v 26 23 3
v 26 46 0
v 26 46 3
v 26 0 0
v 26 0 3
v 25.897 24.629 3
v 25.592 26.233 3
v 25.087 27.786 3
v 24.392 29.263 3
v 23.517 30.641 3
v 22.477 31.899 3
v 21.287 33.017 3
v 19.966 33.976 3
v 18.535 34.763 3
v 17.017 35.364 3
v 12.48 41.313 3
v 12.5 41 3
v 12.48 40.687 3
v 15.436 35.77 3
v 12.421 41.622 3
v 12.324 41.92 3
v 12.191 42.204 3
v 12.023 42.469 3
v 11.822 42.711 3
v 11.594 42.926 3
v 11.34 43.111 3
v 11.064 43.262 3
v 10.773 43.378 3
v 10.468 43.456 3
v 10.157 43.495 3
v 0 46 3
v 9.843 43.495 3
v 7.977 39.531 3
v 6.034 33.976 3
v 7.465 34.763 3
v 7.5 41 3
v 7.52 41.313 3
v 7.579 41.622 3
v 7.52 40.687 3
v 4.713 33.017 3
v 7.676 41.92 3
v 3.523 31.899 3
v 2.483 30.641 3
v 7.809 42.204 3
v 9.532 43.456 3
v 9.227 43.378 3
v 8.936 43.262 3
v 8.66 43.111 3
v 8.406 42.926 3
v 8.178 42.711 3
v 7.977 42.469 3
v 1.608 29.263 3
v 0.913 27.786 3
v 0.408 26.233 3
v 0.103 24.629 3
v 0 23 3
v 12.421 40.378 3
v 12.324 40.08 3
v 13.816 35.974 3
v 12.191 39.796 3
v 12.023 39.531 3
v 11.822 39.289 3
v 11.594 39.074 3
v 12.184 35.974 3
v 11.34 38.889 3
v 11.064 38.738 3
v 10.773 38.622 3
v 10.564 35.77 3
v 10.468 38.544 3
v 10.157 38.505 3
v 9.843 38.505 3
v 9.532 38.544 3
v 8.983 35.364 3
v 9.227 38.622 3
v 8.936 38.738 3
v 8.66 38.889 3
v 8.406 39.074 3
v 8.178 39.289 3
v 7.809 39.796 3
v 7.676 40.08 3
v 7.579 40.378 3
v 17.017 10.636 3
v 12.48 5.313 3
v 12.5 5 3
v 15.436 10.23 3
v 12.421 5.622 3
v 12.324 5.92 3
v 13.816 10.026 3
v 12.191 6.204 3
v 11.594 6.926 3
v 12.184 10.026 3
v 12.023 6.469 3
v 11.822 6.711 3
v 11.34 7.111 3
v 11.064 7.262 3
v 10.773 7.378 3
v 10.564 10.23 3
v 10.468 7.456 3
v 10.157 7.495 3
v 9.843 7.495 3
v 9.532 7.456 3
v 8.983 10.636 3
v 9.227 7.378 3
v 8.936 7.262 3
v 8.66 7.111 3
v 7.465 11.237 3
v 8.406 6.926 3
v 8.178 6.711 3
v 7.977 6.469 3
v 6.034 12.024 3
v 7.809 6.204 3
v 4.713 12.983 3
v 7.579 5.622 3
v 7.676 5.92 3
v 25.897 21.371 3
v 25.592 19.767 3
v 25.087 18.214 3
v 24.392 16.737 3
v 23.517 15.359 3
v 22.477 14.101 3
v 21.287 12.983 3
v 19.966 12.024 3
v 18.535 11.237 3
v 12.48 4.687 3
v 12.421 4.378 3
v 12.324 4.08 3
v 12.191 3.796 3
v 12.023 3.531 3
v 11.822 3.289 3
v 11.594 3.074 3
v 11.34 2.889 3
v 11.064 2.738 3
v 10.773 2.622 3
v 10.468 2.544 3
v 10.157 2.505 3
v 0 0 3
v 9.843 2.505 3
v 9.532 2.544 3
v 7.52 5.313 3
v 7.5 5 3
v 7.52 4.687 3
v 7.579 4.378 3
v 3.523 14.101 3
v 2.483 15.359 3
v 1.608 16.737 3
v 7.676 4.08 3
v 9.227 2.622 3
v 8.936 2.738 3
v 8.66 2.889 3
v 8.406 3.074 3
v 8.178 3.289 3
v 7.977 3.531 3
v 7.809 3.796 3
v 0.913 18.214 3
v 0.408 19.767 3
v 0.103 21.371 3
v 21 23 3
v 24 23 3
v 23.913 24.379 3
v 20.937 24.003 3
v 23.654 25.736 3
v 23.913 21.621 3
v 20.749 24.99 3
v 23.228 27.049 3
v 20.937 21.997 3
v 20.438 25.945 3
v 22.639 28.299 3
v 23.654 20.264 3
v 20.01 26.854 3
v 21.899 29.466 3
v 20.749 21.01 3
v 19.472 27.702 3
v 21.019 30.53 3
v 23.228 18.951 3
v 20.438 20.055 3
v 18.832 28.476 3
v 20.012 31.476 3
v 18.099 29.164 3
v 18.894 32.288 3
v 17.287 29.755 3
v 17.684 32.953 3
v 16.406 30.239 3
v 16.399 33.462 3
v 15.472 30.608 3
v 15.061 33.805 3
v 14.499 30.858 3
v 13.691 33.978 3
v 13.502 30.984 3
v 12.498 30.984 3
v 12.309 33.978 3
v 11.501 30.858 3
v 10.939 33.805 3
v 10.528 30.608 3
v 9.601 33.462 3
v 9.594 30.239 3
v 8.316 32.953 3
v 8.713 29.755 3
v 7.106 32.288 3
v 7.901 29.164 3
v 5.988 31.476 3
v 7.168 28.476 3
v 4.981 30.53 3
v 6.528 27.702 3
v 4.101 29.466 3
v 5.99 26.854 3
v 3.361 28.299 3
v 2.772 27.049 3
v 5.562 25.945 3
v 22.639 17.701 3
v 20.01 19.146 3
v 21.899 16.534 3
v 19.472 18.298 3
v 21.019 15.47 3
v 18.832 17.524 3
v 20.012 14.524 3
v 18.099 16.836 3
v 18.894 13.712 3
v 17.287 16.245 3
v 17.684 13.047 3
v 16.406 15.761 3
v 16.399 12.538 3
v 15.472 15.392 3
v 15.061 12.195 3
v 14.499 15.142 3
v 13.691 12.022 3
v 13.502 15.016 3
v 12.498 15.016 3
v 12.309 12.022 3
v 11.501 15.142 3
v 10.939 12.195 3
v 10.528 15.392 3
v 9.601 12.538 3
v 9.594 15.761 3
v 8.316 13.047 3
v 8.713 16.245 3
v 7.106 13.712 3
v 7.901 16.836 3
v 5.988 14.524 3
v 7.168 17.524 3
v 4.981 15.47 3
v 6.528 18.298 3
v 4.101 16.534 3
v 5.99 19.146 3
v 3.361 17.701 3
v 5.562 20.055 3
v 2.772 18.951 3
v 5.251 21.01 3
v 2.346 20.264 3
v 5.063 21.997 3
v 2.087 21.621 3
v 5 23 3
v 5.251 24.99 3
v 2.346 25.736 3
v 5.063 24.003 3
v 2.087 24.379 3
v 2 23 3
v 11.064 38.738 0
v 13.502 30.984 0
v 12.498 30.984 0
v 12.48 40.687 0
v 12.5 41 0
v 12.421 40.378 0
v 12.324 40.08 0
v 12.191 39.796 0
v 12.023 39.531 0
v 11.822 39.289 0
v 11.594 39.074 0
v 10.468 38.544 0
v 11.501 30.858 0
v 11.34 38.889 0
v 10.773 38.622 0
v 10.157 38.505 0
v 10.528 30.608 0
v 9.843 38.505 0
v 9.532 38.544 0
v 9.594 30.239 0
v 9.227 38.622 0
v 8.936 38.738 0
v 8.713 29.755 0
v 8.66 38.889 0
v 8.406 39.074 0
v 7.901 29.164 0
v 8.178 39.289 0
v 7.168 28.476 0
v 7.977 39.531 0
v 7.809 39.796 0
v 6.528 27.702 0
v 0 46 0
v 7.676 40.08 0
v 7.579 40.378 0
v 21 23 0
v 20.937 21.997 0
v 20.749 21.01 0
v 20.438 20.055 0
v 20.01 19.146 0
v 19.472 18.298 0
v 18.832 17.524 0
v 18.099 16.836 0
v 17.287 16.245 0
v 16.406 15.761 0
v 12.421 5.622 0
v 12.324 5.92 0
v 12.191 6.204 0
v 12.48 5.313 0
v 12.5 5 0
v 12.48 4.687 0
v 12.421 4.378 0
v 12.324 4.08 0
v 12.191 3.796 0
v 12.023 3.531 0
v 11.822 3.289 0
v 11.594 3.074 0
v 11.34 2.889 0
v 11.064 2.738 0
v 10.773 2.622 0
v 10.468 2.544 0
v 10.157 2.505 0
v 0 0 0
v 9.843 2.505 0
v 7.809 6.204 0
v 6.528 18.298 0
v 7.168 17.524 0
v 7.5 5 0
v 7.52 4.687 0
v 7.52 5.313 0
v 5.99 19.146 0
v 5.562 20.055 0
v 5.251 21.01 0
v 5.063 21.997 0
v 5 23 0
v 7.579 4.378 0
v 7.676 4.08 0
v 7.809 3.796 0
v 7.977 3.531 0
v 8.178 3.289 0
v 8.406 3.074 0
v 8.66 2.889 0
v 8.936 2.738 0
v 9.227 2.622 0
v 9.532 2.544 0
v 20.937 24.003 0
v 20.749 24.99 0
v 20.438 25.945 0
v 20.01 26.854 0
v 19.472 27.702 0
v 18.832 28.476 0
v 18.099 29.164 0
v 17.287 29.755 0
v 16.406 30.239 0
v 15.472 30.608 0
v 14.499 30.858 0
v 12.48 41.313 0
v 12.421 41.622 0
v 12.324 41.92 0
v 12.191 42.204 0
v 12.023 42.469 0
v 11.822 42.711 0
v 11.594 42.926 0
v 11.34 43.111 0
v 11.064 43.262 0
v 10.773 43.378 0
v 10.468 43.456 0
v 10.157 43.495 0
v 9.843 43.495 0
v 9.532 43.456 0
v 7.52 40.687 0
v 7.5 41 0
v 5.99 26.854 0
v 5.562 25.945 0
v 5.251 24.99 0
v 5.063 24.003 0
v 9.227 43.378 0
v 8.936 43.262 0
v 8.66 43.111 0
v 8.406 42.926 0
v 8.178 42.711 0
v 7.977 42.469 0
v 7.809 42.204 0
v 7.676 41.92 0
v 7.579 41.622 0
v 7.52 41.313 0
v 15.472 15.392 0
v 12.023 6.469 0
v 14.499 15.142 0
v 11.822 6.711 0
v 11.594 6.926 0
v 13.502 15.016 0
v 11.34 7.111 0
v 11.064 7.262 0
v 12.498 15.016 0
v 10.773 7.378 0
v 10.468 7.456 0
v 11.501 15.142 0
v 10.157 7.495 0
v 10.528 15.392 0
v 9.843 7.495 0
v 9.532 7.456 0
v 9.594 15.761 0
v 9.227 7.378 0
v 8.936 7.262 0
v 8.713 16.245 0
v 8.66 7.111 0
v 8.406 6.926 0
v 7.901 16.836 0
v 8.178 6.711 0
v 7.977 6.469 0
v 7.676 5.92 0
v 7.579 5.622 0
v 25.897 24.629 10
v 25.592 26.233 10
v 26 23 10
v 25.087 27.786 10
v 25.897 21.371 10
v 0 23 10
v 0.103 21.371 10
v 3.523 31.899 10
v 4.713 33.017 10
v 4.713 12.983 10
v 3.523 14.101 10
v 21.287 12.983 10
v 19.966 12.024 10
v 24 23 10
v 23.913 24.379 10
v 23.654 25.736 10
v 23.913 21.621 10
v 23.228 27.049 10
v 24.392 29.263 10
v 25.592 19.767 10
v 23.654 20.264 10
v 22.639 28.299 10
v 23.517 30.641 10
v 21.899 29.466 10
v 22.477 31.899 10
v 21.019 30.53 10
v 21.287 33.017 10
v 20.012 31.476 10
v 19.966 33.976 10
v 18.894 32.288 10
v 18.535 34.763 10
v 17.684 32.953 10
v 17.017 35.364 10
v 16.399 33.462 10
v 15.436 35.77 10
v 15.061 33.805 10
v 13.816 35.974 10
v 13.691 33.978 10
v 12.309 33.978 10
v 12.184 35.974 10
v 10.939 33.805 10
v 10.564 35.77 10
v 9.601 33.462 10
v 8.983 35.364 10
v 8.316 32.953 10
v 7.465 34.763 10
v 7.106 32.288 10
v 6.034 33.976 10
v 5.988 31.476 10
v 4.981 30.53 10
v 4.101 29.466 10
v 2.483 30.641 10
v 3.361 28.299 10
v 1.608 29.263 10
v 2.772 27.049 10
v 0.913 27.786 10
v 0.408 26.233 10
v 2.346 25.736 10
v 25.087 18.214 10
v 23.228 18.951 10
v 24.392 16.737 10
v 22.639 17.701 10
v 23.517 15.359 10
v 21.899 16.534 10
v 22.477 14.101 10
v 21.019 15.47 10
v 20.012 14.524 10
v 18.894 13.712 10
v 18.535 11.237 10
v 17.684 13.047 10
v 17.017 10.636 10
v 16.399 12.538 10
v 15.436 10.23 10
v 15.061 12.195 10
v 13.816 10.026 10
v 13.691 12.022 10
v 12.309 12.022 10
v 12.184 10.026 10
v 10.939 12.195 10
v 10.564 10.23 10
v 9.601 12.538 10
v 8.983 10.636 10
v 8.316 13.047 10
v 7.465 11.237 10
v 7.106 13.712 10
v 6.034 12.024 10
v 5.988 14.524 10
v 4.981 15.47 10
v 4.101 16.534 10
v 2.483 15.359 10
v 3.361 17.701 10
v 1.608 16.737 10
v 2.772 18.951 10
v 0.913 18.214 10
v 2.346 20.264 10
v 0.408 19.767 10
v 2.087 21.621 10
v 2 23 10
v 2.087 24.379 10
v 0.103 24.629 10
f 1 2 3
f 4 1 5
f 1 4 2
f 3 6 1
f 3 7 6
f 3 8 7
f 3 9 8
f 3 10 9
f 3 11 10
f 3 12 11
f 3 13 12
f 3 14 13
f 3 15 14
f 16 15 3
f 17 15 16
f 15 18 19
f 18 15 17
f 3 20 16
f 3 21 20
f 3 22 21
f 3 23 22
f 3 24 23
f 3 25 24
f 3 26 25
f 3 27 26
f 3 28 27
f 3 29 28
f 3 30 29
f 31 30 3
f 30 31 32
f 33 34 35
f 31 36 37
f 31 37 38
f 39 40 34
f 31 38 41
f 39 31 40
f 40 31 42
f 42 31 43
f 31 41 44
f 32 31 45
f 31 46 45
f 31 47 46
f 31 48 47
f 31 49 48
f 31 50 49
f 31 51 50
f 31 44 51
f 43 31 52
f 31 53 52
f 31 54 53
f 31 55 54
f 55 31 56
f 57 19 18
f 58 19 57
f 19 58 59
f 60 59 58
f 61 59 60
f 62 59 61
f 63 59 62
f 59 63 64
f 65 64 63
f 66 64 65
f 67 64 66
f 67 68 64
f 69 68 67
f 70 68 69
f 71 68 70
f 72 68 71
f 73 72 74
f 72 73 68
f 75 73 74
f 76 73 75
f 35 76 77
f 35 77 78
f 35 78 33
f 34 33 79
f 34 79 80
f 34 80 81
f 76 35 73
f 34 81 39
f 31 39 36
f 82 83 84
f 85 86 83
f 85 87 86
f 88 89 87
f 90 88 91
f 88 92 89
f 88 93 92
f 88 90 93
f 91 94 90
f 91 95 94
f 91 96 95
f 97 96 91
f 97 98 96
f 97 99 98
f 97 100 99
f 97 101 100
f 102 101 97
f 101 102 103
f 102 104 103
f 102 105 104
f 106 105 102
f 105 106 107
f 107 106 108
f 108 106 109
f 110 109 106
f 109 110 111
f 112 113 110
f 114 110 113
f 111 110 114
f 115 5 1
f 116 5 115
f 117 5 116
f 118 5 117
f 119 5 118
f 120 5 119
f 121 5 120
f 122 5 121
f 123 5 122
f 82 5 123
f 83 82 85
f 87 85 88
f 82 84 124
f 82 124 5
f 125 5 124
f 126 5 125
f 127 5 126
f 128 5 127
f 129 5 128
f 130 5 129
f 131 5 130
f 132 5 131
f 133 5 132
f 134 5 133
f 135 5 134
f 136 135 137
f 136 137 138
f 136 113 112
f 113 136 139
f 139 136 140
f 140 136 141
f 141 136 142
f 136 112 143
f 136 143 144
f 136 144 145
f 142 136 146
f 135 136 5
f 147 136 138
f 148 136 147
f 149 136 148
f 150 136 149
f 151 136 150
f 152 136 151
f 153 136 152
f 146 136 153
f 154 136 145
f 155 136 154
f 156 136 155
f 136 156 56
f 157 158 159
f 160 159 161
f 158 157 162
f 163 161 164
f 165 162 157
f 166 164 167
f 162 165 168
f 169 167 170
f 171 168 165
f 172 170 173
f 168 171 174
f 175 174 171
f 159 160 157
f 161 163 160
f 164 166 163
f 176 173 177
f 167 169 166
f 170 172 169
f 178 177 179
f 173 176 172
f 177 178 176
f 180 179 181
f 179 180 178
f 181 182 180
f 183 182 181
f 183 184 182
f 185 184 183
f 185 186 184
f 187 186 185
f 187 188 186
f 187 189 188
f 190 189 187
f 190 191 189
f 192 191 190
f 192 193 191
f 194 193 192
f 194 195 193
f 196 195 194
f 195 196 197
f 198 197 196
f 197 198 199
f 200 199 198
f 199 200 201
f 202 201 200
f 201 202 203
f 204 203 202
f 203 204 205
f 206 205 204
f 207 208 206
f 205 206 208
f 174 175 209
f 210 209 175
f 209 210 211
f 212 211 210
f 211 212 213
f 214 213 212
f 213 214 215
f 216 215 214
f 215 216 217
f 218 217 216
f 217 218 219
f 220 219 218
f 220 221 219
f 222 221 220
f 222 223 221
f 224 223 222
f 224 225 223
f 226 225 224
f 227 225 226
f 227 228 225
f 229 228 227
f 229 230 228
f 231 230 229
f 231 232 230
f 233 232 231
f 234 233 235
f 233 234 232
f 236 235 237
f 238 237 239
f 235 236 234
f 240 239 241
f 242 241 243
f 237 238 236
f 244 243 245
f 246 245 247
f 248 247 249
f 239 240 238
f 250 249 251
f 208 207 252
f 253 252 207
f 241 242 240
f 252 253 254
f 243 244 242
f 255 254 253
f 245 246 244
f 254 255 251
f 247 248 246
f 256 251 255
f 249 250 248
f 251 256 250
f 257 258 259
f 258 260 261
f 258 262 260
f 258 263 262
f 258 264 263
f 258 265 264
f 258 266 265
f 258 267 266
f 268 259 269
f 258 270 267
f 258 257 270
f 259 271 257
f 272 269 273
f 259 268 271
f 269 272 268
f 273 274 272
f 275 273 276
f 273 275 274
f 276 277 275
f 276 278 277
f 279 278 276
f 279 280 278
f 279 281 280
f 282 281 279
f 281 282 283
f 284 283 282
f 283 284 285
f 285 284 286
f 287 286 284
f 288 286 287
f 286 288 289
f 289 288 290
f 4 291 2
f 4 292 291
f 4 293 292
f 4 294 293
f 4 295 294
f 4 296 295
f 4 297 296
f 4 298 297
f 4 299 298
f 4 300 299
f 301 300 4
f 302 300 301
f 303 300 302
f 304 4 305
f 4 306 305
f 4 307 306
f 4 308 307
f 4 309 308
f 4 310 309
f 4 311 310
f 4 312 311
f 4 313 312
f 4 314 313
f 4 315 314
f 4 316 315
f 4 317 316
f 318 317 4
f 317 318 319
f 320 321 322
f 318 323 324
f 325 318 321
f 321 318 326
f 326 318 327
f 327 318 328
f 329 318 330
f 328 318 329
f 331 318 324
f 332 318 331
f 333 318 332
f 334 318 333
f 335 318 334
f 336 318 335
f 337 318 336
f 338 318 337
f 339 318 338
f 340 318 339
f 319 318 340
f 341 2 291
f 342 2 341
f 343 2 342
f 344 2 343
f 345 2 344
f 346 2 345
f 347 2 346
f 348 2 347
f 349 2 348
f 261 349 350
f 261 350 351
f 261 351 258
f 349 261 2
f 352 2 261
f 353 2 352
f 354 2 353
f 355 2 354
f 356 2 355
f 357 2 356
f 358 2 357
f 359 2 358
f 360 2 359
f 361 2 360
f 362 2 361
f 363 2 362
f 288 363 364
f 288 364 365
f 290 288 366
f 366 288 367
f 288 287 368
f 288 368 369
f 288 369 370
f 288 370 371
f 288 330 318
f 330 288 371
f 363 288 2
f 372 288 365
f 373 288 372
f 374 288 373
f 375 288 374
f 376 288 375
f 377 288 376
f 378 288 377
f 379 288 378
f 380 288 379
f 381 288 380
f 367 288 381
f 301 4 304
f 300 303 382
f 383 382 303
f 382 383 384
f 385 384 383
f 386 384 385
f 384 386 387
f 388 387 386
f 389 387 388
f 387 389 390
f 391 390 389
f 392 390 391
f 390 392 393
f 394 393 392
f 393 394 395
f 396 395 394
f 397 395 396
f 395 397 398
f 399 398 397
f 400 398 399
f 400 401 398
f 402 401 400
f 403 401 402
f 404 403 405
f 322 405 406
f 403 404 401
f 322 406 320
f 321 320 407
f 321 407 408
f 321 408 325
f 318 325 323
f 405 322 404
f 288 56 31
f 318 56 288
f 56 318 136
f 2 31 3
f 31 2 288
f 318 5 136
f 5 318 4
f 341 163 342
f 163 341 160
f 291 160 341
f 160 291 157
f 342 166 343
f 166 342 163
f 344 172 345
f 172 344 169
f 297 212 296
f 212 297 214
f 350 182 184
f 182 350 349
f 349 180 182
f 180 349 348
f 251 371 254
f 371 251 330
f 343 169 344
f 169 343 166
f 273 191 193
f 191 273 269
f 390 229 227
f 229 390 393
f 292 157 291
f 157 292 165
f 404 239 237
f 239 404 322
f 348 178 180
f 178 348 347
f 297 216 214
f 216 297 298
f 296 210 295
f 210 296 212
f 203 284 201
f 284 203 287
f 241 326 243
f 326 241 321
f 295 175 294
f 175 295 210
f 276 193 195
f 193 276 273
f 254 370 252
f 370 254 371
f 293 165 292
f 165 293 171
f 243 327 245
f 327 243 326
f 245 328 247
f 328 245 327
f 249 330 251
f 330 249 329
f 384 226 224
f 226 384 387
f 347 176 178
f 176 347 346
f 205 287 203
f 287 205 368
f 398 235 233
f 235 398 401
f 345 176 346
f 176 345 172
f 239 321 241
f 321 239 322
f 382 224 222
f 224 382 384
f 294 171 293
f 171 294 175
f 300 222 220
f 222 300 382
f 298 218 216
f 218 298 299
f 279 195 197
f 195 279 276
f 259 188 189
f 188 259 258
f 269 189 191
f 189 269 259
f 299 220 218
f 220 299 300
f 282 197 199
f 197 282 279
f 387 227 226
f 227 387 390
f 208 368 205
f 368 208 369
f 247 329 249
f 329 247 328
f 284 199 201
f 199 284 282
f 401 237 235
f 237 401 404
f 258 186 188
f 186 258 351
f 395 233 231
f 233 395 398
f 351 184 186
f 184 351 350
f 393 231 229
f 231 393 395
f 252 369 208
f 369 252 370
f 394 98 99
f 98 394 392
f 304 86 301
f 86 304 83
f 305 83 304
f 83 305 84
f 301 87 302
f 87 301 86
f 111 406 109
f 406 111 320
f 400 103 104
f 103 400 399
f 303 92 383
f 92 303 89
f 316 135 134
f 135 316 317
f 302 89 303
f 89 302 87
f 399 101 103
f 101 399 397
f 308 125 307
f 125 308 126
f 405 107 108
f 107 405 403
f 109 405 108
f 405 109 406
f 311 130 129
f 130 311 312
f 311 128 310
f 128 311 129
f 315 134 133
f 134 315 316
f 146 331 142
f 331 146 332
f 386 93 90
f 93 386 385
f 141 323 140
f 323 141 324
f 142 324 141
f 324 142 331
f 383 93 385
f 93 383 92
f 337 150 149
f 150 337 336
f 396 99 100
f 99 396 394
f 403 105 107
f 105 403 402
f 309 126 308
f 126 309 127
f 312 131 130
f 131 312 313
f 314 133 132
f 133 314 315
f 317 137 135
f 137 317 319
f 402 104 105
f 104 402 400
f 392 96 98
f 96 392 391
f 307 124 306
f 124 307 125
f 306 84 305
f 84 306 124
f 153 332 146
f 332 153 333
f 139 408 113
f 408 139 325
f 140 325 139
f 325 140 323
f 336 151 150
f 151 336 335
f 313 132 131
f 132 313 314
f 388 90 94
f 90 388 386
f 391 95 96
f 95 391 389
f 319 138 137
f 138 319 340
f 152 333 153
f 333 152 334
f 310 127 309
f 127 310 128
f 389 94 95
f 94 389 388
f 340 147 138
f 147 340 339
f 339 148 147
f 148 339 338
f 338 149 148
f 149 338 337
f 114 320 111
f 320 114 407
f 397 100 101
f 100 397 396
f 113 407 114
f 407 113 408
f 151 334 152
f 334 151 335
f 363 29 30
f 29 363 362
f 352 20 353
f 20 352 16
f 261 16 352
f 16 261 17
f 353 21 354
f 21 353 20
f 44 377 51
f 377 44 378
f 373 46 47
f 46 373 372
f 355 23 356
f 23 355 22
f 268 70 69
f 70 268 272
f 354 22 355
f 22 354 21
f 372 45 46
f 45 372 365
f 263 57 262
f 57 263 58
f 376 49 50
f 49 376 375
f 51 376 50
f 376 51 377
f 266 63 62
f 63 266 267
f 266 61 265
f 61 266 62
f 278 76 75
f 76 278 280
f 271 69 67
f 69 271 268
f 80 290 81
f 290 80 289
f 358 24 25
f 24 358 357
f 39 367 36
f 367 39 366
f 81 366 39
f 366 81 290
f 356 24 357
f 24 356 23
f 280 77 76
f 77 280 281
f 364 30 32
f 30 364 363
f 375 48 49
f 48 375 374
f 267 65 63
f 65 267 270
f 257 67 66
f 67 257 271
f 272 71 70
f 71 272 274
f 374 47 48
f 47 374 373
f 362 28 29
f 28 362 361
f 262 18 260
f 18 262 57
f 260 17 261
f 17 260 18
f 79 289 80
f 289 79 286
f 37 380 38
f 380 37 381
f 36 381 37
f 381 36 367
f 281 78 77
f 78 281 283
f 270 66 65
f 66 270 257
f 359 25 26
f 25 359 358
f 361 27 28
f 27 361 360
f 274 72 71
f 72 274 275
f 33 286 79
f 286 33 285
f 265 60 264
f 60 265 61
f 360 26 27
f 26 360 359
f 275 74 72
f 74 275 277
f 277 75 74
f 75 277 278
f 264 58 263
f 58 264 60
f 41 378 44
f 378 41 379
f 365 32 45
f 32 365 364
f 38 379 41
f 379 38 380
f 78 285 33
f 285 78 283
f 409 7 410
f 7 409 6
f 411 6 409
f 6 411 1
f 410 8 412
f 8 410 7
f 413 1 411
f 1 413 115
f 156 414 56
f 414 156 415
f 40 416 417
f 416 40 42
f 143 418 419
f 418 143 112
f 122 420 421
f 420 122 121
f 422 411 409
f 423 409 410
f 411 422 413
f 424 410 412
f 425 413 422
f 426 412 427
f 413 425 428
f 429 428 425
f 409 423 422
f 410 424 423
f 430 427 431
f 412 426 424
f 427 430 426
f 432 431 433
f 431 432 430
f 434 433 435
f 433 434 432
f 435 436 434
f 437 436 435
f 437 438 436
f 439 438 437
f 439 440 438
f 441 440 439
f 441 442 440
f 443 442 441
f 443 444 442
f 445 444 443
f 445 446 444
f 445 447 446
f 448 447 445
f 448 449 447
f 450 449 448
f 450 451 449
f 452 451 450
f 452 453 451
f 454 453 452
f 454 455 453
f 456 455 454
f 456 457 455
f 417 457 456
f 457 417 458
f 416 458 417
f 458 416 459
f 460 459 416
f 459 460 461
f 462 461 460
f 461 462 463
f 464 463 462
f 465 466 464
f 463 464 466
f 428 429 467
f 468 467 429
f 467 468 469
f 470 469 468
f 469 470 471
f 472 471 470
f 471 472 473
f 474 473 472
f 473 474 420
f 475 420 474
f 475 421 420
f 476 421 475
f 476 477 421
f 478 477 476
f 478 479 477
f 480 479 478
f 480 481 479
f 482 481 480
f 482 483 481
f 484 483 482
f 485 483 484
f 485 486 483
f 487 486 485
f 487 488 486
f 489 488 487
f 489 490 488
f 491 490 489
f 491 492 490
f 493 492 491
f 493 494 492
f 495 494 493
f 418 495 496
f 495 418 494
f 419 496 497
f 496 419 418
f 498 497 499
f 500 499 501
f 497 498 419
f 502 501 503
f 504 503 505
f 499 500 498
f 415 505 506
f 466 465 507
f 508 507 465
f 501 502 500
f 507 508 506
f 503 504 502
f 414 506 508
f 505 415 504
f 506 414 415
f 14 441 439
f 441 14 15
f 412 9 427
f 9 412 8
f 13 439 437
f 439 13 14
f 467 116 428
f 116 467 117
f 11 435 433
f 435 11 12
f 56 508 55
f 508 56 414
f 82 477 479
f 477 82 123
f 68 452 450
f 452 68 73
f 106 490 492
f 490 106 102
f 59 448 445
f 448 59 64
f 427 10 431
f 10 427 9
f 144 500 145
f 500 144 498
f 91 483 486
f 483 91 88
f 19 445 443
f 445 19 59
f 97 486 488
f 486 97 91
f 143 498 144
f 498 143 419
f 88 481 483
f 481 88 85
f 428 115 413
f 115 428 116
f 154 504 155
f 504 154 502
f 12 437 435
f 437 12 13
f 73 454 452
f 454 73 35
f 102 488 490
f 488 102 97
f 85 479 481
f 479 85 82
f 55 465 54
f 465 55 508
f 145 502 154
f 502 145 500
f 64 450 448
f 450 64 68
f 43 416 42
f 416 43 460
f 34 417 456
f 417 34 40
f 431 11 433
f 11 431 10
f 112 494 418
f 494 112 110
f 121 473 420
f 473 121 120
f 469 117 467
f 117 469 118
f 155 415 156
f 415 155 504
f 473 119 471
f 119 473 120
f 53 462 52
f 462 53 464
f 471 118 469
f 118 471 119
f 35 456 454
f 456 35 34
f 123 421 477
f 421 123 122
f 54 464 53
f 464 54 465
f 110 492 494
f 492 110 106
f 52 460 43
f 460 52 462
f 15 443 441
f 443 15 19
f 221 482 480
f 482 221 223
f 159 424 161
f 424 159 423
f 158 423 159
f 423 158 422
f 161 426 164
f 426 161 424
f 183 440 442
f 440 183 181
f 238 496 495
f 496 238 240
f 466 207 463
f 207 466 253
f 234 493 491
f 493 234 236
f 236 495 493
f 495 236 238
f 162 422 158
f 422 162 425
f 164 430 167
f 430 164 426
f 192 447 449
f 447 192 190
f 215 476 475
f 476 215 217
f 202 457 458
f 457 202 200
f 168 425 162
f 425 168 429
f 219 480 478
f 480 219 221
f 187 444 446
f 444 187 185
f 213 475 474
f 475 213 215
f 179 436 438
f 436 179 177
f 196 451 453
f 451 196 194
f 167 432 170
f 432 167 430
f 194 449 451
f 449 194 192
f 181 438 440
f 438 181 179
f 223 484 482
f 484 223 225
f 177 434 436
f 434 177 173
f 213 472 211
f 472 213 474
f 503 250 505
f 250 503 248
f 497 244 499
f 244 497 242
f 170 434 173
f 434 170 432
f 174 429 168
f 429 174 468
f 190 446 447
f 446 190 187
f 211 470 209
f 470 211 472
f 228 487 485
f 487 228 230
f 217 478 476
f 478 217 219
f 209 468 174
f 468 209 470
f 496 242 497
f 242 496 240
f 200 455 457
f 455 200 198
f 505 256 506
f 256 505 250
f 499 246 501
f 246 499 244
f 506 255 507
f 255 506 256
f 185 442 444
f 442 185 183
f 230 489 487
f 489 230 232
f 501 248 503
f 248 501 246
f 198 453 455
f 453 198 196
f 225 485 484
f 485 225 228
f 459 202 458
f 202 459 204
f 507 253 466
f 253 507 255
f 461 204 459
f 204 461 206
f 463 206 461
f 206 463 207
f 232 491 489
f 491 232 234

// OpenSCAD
$fn=50;
dim_x=26;
dim_y=50-4;
plate_thickness=3;
hole_pos=5;
module holder(){
difference(){
cube([dim_x,dim_y,plate_thickness]);
    translate([dim_x/2,dim_y/2,0]) cylinder(r=8,h=7);
    translate([10,hole_pos,0]) cylinder(r=2.5,h=7);
     translate([10,dim_y-hole_pos,0]) cylinder(r=2.5,h=7);
    
};


    translate([dim_x/2,dim_y/2,plate_thickness]){
        difference(){
cylinder(r=13,h=7);
cylinder(r=11,h=7);
        }
    
}

};
holder();
module cap(){
translate([50,0,0]) 

difference(){
cylinder(r=15,h=9);
cylinder(r=13.1,h=7.5);
    cylinder(r=9,h=20);
        }
    };
        
        
       //# translate([dim_x/2,dim_y/2,0]) cylinder(r=4,h=15);
        
       //# cube([20,100,20]);
